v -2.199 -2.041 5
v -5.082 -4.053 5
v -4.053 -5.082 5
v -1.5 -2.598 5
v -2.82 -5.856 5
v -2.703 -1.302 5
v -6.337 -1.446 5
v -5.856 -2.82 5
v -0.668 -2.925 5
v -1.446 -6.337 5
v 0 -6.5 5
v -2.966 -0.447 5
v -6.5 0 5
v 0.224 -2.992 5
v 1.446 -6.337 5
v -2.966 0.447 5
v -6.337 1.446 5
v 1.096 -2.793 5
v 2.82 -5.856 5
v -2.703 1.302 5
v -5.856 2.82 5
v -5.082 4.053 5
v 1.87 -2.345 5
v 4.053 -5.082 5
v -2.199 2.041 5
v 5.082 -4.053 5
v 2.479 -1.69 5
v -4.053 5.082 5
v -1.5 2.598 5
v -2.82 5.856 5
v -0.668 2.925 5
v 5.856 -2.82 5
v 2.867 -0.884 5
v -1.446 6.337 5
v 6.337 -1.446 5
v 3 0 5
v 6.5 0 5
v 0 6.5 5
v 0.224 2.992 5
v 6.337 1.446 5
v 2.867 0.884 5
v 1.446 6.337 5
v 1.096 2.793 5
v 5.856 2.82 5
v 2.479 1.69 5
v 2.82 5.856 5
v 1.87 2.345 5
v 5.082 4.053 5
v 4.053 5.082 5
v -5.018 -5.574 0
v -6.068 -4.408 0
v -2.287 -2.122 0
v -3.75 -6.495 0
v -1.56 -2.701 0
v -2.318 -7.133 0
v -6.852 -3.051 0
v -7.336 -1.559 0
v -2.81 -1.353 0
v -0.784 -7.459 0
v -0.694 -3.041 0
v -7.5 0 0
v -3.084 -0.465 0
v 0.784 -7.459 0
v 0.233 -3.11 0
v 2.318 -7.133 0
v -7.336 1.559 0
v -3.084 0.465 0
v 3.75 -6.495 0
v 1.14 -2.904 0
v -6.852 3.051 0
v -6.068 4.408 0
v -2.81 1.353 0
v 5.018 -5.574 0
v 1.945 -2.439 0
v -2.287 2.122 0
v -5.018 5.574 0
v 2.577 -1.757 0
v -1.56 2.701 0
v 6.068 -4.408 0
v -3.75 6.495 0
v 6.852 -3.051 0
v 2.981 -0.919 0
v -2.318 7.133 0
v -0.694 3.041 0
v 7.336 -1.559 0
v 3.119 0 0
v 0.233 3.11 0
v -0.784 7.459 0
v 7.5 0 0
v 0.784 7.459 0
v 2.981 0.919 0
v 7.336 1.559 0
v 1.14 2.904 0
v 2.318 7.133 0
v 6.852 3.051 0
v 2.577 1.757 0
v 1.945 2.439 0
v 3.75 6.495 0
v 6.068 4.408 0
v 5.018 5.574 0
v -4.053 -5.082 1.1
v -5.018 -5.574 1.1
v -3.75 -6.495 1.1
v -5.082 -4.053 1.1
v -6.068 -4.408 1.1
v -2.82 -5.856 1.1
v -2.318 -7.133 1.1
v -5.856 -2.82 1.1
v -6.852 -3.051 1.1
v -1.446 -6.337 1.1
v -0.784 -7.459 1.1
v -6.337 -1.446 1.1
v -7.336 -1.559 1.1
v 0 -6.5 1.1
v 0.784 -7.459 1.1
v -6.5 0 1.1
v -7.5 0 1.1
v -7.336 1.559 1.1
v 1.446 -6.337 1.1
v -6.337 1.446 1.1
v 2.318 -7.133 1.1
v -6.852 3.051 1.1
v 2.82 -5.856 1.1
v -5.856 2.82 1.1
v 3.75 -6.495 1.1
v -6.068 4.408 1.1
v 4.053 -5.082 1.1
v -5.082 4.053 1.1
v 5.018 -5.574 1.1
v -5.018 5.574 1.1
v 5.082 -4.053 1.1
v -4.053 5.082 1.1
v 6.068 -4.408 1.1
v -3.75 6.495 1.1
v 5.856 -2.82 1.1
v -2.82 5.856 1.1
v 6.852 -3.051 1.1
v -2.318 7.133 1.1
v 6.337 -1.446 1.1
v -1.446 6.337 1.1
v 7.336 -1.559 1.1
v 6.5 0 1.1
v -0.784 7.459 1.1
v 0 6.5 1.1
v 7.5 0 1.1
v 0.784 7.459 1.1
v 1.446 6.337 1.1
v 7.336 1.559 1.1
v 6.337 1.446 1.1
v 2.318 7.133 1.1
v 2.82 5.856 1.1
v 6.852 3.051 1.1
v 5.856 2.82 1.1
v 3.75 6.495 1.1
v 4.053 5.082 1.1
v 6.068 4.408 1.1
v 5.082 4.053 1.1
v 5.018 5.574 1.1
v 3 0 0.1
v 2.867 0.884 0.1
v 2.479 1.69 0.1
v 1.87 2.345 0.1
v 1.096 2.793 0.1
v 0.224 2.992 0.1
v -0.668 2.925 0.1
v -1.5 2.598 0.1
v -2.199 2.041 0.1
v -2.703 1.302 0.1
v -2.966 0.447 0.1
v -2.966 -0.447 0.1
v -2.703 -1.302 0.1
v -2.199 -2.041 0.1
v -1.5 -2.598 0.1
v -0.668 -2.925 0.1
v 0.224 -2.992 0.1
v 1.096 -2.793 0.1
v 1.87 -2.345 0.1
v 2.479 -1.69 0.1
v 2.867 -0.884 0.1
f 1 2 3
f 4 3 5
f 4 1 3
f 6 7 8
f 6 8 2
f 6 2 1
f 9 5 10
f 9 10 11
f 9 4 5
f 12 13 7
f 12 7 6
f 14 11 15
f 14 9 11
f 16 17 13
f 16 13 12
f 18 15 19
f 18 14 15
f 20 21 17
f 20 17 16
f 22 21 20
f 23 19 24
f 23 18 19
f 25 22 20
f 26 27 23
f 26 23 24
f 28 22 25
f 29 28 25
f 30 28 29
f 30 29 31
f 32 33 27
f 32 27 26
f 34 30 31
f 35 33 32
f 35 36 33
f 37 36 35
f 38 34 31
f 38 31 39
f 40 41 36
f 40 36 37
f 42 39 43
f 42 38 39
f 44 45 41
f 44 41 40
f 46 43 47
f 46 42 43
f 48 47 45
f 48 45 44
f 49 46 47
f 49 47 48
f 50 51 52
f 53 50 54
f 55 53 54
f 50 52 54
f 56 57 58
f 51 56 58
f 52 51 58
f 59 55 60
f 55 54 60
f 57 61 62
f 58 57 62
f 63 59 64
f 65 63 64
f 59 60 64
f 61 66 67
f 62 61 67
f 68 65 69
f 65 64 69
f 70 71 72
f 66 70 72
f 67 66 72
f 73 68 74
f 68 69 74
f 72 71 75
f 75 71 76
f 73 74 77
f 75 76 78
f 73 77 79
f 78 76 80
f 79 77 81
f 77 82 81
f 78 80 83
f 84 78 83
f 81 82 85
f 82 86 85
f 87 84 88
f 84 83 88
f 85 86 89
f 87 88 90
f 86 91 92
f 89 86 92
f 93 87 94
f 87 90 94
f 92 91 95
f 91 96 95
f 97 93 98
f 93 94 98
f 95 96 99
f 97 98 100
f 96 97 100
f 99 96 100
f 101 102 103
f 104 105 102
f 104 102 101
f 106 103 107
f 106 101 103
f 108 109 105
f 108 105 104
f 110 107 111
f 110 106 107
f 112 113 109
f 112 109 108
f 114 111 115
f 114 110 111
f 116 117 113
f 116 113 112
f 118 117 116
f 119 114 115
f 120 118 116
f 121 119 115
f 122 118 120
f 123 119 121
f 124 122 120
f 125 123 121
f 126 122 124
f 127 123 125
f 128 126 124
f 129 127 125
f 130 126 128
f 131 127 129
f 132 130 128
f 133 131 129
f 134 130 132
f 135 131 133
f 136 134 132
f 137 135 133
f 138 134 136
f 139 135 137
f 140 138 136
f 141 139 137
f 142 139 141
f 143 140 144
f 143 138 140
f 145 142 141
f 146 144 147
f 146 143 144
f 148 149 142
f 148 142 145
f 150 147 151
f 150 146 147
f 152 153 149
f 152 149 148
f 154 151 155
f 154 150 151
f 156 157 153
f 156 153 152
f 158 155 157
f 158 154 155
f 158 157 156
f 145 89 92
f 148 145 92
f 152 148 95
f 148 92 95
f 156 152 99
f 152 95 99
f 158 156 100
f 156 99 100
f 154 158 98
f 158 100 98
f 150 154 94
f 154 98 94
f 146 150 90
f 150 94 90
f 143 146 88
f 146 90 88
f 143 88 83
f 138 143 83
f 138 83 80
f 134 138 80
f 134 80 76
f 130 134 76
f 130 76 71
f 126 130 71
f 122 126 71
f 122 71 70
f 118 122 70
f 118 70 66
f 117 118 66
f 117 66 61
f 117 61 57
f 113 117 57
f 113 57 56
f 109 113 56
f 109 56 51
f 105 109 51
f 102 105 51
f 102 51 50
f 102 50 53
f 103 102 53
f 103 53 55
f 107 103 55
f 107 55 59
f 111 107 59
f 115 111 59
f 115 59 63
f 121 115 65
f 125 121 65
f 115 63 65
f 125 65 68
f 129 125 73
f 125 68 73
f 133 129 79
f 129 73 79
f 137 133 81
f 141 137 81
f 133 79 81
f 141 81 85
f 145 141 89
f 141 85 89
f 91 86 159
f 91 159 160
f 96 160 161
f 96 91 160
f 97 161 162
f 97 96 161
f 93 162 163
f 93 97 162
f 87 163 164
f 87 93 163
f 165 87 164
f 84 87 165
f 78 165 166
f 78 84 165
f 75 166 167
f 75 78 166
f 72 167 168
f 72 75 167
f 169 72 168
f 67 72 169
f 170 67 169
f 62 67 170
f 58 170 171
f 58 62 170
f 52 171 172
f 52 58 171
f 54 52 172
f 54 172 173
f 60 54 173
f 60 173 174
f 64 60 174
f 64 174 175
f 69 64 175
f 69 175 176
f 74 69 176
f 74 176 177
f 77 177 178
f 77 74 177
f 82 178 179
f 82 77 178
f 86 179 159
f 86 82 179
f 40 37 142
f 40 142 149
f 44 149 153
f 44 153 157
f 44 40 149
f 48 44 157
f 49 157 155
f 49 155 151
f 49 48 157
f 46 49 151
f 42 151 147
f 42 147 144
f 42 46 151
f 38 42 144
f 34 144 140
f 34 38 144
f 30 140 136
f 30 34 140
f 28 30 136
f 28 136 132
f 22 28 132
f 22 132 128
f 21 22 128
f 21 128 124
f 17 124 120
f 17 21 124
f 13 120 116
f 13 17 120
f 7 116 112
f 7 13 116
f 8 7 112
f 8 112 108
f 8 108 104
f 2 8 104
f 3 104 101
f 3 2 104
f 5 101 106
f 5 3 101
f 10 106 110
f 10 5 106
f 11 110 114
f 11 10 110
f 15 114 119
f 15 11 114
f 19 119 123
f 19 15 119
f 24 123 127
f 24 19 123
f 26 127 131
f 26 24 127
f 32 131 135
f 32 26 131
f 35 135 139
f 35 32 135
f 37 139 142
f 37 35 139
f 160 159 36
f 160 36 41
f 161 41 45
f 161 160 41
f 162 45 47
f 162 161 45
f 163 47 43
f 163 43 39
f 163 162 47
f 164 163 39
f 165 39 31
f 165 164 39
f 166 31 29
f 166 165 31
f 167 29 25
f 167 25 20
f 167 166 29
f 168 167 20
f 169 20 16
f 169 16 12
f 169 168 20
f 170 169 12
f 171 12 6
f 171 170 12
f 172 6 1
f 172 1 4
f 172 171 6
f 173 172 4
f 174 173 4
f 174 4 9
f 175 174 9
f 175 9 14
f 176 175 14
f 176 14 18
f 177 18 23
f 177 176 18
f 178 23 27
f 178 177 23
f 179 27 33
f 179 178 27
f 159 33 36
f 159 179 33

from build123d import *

# Parameters (mm, degrees)
SKETCH_1_R          = 7.5
SKETCH_1_R_2        = 3
EXTRUDE_1_DEPTH     = 5
SKETCH_2_R          = 7.5
SKETCH_2_R_2        = 6.5
CUT_EXTRUDE_1_DEPTH = 3.9
CHAMFER_1_SIZE      = 0.1
CHAMFER_1_SIZE2     = 0.119175359


with BuildPart() as part:
    # 草图1 → 凸台-拉伸1 (new body)
    with BuildSketch(Plane.XY):
        Circle(SKETCH_1_R)
        Circle(SKETCH_1_R_2, mode=Mode.SUBTRACT)
    extrude(amount=EXTRUDE_1_DEPTH)

    # 草图2 → 切除-拉伸1 (cut)
    with BuildSketch(Plane.XY.offset(5)):
        Circle(SKETCH_2_R)
        Circle(SKETCH_2_R_2, mode=Mode.SUBTRACT)
    extrude(amount=-CUT_EXTRUDE_1_DEPTH, mode=Mode.SUBTRACT)

    # 倒角1
    chamfer_1_edges = [part.edges().sort_by_distance(p)[0] for p in [
        (-3, 0, 0),
    ]]
    chamfer_1_side = [part.faces().sort_by_distance(p)[0] for p in [
        (-3, 0, 2.5),
    ]]
    chamfer(chamfer_1_edges, length=CHAMFER_1_SIZE, length2=CHAMFER_1_SIZE2, reference=chamfer_1_side[0])


solid = part.part
